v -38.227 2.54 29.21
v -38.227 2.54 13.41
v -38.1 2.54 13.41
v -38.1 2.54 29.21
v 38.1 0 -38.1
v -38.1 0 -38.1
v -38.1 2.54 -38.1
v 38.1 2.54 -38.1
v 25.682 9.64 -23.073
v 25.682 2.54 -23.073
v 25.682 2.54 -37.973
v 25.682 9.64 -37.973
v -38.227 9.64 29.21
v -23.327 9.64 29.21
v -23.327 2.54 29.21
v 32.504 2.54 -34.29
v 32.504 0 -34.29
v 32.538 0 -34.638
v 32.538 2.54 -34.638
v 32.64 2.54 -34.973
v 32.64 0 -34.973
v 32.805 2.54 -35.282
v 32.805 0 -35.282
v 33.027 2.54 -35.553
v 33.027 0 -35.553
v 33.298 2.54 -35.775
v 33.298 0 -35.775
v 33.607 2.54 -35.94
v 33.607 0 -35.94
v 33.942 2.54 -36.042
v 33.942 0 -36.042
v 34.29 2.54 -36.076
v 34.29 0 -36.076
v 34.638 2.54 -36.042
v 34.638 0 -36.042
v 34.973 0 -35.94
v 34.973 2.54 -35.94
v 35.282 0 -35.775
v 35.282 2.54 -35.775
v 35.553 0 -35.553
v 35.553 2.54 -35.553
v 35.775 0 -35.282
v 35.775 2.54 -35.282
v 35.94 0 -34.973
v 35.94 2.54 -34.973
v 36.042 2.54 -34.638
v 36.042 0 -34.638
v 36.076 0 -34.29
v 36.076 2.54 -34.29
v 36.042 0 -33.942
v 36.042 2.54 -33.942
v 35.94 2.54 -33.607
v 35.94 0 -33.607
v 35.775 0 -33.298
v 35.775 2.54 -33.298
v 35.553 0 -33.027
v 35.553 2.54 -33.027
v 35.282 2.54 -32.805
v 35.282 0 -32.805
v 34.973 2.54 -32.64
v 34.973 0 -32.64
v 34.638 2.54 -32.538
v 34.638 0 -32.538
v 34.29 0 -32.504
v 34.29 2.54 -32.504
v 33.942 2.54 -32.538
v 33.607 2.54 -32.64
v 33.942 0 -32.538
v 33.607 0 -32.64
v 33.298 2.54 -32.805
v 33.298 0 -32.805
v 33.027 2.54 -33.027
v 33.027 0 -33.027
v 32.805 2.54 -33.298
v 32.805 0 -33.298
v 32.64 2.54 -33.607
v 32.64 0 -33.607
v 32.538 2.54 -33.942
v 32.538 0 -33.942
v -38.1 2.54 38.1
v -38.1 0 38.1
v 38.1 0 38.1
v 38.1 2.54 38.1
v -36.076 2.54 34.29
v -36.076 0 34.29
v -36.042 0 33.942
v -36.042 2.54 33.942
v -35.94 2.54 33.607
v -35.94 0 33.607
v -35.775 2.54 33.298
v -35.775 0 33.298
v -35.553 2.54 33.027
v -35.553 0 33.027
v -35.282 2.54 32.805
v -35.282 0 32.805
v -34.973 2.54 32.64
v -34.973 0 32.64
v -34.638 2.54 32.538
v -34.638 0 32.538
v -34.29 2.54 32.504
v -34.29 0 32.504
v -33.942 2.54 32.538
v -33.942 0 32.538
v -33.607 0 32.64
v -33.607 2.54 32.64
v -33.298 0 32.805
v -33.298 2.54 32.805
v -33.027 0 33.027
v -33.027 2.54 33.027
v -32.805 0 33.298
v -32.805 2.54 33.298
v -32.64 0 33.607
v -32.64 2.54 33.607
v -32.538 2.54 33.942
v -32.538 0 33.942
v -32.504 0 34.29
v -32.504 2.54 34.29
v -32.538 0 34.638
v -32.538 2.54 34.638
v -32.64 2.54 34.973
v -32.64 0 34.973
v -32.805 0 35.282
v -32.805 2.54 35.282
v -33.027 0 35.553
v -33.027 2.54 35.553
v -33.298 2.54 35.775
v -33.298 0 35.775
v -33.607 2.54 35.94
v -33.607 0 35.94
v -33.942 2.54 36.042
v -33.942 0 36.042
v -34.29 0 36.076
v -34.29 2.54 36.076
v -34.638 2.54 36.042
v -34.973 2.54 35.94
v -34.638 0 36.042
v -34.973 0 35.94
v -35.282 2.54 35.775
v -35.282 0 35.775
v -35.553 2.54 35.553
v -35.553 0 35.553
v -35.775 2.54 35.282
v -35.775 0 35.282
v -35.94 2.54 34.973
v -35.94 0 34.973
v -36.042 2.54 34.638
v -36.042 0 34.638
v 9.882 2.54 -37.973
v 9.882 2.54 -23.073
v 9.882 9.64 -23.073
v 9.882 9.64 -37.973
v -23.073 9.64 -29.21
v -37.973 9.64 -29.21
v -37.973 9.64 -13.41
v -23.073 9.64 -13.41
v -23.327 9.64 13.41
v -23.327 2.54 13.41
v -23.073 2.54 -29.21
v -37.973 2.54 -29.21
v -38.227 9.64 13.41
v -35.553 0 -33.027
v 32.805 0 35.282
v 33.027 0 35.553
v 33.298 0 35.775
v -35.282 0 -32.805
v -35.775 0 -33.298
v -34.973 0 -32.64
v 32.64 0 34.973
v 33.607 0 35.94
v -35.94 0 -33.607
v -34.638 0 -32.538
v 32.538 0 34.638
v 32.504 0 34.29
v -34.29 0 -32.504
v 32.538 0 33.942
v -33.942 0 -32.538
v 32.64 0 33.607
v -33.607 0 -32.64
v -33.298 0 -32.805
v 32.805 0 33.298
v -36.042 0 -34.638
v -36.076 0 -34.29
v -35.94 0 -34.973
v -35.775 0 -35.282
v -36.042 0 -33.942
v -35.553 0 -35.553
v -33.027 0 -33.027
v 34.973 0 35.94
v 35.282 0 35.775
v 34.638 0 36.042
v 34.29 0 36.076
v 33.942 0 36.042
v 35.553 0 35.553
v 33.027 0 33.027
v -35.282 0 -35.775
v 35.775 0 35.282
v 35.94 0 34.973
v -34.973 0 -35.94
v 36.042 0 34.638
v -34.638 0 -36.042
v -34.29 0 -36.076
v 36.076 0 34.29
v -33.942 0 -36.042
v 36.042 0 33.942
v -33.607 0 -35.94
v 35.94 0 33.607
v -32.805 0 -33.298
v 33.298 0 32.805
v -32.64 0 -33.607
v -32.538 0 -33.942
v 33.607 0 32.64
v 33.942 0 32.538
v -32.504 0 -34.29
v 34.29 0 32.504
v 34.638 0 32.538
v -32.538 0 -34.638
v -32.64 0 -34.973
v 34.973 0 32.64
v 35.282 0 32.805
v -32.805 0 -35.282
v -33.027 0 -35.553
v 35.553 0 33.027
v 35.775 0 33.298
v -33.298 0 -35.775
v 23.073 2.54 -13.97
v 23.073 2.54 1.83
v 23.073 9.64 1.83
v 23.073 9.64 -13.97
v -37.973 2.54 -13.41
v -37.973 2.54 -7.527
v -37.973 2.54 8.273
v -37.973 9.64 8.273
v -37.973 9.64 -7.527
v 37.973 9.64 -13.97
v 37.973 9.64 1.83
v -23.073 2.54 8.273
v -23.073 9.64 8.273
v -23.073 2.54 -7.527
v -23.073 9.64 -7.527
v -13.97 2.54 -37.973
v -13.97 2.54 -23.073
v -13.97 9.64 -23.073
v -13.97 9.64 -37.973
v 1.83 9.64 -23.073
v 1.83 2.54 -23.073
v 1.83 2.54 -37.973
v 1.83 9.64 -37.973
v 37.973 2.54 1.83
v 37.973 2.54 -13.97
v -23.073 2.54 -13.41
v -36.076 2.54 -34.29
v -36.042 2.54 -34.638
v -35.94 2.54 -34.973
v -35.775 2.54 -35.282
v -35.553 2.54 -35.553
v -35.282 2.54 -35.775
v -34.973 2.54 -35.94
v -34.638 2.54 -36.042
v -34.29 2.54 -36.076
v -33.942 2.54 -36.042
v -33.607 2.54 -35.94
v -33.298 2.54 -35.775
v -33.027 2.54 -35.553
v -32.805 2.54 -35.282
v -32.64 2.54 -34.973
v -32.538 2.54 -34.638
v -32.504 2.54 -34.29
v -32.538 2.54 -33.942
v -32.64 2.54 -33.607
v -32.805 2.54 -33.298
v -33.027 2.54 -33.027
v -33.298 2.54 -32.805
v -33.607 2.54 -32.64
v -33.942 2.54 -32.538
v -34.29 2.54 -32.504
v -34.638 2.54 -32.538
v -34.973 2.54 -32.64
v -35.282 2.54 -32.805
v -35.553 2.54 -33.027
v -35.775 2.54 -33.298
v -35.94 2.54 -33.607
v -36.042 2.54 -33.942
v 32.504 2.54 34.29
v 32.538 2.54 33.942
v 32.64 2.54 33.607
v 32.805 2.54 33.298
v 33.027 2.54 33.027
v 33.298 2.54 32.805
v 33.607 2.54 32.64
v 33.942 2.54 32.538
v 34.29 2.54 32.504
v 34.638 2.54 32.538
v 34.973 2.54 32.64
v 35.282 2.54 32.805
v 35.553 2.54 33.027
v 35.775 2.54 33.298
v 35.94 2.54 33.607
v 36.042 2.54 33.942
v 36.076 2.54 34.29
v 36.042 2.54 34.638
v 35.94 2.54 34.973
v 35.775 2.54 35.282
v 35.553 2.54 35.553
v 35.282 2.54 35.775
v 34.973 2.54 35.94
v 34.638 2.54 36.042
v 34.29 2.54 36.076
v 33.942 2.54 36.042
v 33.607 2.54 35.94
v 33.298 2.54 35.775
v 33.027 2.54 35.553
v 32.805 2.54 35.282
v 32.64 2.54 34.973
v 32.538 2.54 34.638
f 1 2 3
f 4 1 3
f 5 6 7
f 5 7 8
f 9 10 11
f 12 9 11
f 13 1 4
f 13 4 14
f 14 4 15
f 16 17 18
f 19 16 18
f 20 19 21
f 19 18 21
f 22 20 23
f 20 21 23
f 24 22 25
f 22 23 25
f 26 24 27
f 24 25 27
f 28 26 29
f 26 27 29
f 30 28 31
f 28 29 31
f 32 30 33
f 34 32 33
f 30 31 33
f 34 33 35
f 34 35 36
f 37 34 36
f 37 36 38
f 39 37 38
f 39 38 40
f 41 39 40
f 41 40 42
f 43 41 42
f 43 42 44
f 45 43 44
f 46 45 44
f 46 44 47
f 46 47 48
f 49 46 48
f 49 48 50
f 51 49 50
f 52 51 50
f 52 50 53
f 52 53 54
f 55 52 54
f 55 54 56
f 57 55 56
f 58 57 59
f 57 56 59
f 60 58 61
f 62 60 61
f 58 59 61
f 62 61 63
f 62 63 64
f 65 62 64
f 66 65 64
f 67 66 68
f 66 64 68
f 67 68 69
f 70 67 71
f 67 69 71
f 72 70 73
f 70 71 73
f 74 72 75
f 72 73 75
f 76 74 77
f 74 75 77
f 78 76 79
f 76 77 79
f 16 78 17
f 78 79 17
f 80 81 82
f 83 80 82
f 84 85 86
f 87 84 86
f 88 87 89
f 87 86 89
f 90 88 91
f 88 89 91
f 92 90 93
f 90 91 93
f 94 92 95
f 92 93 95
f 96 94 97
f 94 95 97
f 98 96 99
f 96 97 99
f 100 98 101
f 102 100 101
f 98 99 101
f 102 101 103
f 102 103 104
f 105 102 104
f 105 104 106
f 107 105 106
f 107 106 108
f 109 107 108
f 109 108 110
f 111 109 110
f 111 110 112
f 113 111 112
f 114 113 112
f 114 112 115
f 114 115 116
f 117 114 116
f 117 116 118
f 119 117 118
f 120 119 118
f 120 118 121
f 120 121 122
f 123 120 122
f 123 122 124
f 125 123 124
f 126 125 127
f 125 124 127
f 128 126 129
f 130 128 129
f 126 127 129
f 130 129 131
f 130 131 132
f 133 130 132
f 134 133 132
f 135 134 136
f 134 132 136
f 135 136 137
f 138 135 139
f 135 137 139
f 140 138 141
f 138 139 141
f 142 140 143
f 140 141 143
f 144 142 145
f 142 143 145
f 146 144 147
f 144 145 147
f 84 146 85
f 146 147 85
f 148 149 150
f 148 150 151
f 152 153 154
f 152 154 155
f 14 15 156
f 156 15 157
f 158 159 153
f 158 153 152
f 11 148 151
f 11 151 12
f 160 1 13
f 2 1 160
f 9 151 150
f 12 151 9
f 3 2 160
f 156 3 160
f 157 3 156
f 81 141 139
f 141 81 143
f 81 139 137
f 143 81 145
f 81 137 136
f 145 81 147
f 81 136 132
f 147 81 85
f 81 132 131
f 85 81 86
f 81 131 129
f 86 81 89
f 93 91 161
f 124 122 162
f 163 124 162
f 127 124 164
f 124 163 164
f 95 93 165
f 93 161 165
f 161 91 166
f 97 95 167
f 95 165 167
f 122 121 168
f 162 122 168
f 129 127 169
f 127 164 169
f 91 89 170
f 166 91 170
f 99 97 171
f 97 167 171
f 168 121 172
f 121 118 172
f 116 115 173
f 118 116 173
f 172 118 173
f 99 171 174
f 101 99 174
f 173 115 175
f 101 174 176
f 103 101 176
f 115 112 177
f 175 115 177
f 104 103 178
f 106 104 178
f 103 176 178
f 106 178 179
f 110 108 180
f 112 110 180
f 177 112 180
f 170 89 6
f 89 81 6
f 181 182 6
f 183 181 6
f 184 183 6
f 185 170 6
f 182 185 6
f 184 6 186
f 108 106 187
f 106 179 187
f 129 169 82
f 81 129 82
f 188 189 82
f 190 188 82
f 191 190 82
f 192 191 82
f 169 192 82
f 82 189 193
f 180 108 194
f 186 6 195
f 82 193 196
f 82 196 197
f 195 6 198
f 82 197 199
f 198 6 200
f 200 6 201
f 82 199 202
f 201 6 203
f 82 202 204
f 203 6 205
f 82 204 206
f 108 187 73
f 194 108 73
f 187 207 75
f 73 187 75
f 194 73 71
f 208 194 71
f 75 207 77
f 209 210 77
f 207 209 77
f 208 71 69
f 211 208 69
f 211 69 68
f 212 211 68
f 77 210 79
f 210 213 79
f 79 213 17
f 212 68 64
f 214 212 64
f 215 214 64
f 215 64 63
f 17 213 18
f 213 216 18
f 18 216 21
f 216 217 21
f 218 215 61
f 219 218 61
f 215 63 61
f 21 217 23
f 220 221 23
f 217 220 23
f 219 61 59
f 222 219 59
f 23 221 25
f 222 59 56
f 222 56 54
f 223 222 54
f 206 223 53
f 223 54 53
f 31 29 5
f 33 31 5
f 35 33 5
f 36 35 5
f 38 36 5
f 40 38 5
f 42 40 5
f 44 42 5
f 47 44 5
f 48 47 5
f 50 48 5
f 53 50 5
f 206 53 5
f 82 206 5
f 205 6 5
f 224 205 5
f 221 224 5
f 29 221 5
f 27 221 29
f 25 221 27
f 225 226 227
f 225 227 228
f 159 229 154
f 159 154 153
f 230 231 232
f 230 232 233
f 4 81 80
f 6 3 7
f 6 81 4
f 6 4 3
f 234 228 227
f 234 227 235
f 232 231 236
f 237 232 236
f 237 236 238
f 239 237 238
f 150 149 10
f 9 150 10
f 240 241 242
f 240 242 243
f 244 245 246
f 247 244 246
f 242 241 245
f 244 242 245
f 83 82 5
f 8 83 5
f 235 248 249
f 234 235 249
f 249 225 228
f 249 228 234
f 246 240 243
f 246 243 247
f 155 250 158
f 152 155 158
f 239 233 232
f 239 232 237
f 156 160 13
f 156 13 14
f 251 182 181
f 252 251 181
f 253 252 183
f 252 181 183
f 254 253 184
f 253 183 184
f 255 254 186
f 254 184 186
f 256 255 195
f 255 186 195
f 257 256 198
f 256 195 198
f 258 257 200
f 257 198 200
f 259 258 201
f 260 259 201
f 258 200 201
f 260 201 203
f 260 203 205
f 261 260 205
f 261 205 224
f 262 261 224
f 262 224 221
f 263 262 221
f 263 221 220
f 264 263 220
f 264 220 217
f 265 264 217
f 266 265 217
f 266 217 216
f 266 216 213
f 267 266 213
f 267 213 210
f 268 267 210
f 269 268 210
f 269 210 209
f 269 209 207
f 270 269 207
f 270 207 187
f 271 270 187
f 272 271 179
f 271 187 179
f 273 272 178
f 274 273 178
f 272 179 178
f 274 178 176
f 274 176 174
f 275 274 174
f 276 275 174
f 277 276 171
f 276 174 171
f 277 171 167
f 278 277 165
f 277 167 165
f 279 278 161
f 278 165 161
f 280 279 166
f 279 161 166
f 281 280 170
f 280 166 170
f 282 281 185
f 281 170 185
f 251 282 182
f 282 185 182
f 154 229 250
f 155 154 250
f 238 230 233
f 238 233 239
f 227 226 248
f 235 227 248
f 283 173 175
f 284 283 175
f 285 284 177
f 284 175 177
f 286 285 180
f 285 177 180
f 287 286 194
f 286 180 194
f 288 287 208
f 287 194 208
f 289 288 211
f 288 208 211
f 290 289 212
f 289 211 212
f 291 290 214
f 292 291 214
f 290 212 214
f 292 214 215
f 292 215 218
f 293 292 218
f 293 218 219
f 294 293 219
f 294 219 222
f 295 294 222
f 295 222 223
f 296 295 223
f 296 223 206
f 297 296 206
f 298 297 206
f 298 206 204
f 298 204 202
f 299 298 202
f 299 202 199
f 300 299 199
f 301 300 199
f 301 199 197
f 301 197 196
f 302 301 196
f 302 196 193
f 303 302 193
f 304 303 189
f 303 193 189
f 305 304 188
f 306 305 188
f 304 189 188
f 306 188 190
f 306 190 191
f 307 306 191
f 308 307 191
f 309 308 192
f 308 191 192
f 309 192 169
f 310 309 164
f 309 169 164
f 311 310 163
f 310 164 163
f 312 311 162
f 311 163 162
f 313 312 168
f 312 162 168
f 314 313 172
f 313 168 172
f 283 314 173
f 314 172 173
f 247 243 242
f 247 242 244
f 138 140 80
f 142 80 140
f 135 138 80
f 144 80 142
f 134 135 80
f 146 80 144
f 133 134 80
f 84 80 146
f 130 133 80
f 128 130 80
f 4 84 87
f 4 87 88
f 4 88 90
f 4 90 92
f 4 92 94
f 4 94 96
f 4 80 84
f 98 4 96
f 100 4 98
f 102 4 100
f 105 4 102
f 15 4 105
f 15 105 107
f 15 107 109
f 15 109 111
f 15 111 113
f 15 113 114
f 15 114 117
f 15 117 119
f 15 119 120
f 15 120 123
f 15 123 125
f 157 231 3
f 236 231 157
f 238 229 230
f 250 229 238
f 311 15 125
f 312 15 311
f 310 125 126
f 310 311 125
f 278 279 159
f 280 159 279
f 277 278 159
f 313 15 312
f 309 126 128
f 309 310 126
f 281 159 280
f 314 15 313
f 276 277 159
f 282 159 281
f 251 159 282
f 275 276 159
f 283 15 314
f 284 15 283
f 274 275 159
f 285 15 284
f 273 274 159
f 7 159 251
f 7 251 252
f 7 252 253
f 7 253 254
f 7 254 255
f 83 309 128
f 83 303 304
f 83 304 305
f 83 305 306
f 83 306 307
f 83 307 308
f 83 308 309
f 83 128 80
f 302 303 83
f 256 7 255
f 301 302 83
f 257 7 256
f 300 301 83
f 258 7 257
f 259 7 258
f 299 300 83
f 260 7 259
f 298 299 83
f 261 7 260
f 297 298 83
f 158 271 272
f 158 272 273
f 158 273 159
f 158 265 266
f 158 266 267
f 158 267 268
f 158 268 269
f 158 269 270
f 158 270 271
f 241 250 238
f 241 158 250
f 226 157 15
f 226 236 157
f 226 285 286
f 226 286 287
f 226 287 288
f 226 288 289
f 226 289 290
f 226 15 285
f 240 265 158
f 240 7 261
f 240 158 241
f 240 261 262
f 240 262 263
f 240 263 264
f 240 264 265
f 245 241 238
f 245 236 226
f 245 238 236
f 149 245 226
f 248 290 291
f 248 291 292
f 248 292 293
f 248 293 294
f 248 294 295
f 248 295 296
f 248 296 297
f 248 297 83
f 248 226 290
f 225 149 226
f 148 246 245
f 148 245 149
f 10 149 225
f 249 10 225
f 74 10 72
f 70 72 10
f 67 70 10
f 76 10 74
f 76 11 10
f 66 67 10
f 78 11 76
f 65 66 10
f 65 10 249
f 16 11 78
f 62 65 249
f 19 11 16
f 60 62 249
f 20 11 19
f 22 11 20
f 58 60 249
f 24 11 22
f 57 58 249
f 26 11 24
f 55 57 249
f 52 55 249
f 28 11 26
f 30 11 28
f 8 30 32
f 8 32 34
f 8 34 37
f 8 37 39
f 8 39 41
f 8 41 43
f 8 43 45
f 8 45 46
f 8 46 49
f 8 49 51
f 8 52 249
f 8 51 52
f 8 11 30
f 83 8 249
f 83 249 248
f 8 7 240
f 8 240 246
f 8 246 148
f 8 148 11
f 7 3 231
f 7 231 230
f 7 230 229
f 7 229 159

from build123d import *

# Parameters (mm, degrees)
SKETCH1_W                           = 76.2
SKETCH1_H                           = 76.2
BOSS_EXTRUDE1_DEPTH                 = 2.54
SKETCH2_W                           = 14.9
SKETCH2_H                           = 15.8
SKETCH2_W_2                         = 15.8
SKETCH2_H_2                         = 14.9
BOSS_EXTRUDE2_DEPTH                 = 7.1
F_9_64_0_14063_DIAMETER_HOLE1_D     = 3.572002
F_9_64_0_14063_DIAMETER_HOLE1_DEPTH = 5.7404
F_9_64_0_14063_DIAMETER_HOLE1_TIP   = 1.073137666


with BuildPart() as part:
    # Sketch1 → Boss-Extrude1 (new body)
    with BuildSketch(Plane(origin=(0, 0, 0), x_dir=(1, 0, 0), z_dir=(0, 1, 0))):
        Rectangle(SKETCH1_W, SKETCH1_H)
    extrude(amount=BOSS_EXTRUDE1_DEPTH)

    # Sketch2 → Boss-Extrude2 (add)
    with BuildSketch(Plane(origin=(0, 2.54, 0), x_dir=(1, 0, 0), z_dir=(0, 1, 0))):
        with Locations((-30.777, -21.31)):
            Rectangle(SKETCH2_W, SKETCH2_H)
        with Locations((-30.523, 21.31)):
            Rectangle(SKETCH2_W, SKETCH2_H)
        with Locations((-6.07, 30.523)):
            Rectangle(SKETCH2_W_2, SKETCH2_H_2)
        with Locations((17.7818, 30.523)):
            Rectangle(SKETCH2_W_2, SKETCH2_H_2)
        with Locations((30.523, 6.07)):
            Rectangle(SKETCH2_W, SKETCH2_H)
        with Locations((-30.523, -0.372526433)):
            Rectangle(SKETCH2_W, SKETCH2_H)
    extrude(amount=BOSS_EXTRUDE2_DEPTH)

    # 9/64 (0.14063) Diameter Hole1
    with Locations(Plane(origin=(0, 2.54, 0), x_dir=(1, 0, 0), z_dir=(0, 1, 0))):
        with Locations((34.29, -34.29), (-34.29, -34.29), (-34.29, 34.29), (34.29, 34.29)):
            Hole(F_9_64_0_14063_DIAMETER_HOLE1_D / 2, depth=F_9_64_0_14063_DIAMETER_HOLE1_DEPTH)
            with Locations((0, 0, -(F_9_64_0_14063_DIAMETER_HOLE1_DEPTH + F_9_64_0_14063_DIAMETER_HOLE1_TIP / 2))):  # 118° drill point
                Cone(0, F_9_64_0_14063_DIAMETER_HOLE1_D / 2, F_9_64_0_14063_DIAMETER_HOLE1_TIP, mode=Mode.SUBTRACT)


solid = part.part
